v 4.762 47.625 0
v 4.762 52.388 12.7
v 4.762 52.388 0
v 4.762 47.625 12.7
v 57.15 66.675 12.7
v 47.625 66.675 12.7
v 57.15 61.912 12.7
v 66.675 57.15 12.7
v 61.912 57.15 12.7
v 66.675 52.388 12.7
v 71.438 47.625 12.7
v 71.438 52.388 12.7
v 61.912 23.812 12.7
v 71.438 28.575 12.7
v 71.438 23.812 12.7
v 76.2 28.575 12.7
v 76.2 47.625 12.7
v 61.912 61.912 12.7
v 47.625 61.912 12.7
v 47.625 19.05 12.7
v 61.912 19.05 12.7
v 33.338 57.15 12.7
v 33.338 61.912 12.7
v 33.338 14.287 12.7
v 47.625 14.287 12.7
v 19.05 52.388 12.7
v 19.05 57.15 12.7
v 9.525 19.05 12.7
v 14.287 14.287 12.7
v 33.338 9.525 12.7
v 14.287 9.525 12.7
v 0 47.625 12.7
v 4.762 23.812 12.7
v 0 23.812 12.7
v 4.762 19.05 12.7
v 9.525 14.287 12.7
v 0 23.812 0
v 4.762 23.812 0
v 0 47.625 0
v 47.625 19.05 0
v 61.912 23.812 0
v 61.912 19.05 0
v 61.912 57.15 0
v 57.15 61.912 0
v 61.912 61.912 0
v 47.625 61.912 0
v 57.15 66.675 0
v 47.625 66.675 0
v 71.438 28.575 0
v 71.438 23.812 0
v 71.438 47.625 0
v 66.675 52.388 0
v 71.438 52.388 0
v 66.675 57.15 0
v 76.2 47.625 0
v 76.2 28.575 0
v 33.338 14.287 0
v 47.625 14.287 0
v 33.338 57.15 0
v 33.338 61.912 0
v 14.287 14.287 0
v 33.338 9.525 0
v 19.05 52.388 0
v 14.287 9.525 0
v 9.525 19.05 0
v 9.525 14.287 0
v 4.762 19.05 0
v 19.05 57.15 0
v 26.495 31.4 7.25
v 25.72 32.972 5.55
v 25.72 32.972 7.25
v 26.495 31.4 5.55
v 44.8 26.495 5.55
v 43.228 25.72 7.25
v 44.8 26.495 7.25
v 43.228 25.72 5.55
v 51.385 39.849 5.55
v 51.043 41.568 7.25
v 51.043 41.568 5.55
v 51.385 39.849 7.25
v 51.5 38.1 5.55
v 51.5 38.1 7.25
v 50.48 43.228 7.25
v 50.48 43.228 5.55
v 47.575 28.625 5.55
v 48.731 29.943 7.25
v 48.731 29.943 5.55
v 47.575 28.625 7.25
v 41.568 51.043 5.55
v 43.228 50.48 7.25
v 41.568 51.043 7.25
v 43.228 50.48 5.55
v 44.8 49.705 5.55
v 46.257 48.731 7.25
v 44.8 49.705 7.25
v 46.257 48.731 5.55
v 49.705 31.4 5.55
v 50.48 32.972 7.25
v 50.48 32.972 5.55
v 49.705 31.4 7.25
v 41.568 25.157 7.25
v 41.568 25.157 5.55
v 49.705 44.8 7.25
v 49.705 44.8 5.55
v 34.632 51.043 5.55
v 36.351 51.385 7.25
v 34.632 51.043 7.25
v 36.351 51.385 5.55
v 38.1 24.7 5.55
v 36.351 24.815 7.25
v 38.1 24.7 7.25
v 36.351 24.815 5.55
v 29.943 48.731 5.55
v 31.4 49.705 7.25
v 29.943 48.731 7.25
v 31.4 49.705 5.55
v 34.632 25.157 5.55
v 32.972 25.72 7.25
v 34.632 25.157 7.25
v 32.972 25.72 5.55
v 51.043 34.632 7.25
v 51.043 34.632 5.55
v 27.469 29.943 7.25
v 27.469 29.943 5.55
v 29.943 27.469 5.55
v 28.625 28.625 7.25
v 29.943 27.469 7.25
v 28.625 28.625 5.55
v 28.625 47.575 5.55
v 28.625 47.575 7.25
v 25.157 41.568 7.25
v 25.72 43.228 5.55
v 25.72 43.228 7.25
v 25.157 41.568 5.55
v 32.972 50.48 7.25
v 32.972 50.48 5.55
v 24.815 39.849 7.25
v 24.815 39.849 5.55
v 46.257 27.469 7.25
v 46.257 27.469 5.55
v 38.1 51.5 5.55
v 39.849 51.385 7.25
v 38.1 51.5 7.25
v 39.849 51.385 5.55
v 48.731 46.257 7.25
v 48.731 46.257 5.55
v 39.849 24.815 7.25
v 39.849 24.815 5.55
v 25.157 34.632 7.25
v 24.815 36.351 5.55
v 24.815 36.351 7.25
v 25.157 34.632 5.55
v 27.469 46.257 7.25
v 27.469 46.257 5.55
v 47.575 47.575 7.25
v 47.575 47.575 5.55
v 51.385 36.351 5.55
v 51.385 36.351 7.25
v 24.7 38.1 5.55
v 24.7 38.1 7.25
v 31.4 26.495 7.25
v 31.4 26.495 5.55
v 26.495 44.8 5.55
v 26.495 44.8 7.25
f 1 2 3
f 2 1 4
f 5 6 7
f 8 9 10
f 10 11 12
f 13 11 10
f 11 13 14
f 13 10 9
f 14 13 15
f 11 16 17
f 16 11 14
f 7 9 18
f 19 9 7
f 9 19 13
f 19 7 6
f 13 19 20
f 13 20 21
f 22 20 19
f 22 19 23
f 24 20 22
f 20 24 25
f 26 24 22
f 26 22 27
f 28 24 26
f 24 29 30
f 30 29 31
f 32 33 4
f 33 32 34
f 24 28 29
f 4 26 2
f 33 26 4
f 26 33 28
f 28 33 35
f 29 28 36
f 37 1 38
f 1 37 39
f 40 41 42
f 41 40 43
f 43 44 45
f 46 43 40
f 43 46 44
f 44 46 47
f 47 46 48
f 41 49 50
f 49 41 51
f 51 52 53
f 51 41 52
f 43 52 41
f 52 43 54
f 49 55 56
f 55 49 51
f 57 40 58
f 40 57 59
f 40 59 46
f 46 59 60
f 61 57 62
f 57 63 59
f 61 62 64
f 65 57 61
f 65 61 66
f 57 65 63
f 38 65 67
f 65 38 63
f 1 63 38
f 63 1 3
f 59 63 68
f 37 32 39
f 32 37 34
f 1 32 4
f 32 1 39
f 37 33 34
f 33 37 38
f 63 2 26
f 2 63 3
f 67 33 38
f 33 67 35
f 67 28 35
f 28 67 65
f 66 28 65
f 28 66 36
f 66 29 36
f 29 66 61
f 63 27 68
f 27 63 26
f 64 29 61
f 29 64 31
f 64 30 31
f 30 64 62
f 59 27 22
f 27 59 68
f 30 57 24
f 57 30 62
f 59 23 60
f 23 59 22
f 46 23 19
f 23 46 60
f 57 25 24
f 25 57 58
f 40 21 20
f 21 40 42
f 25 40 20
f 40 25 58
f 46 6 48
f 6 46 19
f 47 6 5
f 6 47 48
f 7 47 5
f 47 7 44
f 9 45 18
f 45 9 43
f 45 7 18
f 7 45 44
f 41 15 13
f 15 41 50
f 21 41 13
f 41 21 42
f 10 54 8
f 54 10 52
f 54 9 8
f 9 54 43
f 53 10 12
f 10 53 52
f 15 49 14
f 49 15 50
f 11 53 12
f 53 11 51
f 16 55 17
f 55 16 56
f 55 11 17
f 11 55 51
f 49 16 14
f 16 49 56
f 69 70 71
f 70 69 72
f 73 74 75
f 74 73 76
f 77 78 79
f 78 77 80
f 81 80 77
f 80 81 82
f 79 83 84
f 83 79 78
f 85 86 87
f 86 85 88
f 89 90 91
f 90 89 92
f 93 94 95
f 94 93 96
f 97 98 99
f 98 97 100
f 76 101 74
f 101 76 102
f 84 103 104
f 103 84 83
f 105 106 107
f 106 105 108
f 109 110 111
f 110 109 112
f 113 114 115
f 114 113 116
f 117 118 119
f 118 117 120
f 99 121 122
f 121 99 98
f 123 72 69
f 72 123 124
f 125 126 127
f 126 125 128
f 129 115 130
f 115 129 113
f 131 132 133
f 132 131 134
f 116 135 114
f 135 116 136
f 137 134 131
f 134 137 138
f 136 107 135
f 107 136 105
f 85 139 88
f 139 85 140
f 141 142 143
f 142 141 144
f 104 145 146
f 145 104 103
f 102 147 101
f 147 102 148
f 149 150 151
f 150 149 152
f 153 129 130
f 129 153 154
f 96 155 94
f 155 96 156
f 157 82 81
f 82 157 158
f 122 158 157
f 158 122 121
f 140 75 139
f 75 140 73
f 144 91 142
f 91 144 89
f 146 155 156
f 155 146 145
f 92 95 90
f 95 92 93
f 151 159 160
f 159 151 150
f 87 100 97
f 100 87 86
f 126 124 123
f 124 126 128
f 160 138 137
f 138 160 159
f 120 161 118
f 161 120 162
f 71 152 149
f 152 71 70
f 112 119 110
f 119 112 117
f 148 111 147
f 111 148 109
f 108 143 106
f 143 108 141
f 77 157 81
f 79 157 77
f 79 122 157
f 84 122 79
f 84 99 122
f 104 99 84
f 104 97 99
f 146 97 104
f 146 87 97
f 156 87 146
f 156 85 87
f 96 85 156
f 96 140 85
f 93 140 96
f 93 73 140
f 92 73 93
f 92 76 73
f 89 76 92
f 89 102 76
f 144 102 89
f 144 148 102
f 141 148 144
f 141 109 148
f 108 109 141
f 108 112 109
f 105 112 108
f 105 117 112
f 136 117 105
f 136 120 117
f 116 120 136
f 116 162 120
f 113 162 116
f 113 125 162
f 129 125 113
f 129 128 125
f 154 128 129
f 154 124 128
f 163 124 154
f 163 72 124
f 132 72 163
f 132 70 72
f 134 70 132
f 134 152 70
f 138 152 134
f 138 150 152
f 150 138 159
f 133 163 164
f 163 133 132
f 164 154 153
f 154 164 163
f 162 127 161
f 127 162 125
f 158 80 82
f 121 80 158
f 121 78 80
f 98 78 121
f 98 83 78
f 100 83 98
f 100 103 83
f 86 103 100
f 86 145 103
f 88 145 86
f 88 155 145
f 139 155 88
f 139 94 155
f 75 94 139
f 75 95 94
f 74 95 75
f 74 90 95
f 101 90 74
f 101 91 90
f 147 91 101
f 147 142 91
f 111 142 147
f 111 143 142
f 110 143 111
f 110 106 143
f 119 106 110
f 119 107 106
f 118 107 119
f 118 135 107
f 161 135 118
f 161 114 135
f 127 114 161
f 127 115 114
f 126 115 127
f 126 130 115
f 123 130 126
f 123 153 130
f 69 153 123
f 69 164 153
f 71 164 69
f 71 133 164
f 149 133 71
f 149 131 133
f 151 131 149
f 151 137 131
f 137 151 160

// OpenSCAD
// iron_ingot — Minecraft Item Shape 3D Model
// Auto-generated from minecraft/textures/item/iron_ingot.png
//
// Open in OpenSCAD → F5 preview → F6 render → F7 export STL

// ============================================================
// PARAMETERS
// ============================================================

GRID_SIZE_IN    = 3.0;           // crafting table slot size
PIXELS          = 16;              // grid divisions (shape-fitted)
PIXEL_MM        = (GRID_SIZE_IN * 25.4) / PIXELS;  // mm per pixel

DEPTH_IN        = 0.5;          // extrusion depth in inches
DEPTH_MM        = DEPTH_IN * 25.4;

// NFC tag (NTAG215 25mm coin)
TAG_DIAMETER    = 26;           // mm — slightly oversized for easy drop-in
TAG_THICKNESS   = 1.2;         // mm
TAG_CLEARANCE   = 0.4;         // mm extra around tag

cavity_d = TAG_DIAMETER + TAG_CLEARANCE * 2;
cavity_h = TAG_THICKNESS + TAG_CLEARANCE;

echo(str("Tag cavity: ", cavity_d, "mm dia × ", cavity_h, "mm deep"));
echo(str("PAUSE AT: ", DEPTH_MM / 2 + cavity_h / 2, "mm to insert tag"));

module tag_cavity() {
    cx = (7.5 + 0.5) * PIXEL_MM;
    cy = (PIXELS - 1 - 7.5 + 0.5) * PIXEL_MM;
    translate([cx, cy, DEPTH_MM / 2 - cavity_h / 2])
        cylinder(d = cavity_d, h = cavity_h + 0.1, $fn = 48);
}

module tag_shelf() {
    cx = (7.5 + 0.5) * PIXEL_MM;
    cy = (PIXELS - 1 - 7.5 + 0.5) * PIXEL_MM;
    translate([cx, cy, DEPTH_MM / 2 - cavity_h / 2 - 1.0])
        cylinder(d = cavity_d + 4, h = 1.0, $fn = 48);
}

echo(str("Pixel size: ", PIXEL_MM, "mm"));
echo(str("Footprint: ", PIXELS * PIXEL_MM, "mm = ", GRID_SIZE_IN, " in"));
echo(str("Depth: ", DEPTH_MM, "mm = ", DEPTH_IN, " in"));

// ============================================================
// PIXEL MAP — 135 opaque pixels
// ============================================================

item_pixels = [
    [0.0,6.0], [0.0,7.0], [0.0,8.0], [0.0,9.0], [0.0,10.0], [1.0,5.0], [1.0,6.0], [1.0,7.0],
    [1.0,8.0], [1.0,9.0], [1.0,10.0], [1.0,11.0], [2.0,5.0], [2.0,6.0], [2.0,7.0], [2.0,8.0],
    [2.0,9.0], [2.0,10.0], [2.0,11.0], [2.0,12.0], [3.0,5.0], [3.0,6.0], [3.0,7.0], [3.0,8.0],
    [3.0,9.0], [3.0,10.0], [3.0,11.0], [3.0,12.0], [3.0,13.0], [4.0,4.0], [4.0,5.0], [4.0,6.0],
    [4.0,7.0], [4.0,8.0], [4.0,9.0], [4.0,10.0], [4.0,11.0], [4.0,12.0], [4.0,13.0], [5.0,4.0],
    [5.0,5.0], [5.0,6.0], [5.0,7.0], [5.0,8.0], [5.0,9.0], [5.0,10.0], [5.0,11.0], [5.0,12.0],
    [5.0,13.0], [6.0,4.0], [6.0,5.0], [6.0,6.0], [6.0,7.0], [6.0,8.0], [6.0,9.0], [6.0,10.0],
    [6.0,11.0], [6.0,12.0], [6.0,13.0], [7.0,3.0], [7.0,4.0], [7.0,5.0], [7.0,6.0], [7.0,7.0],
    [7.0,8.0], [7.0,9.0], [7.0,10.0], [7.0,11.0], [7.0,12.0], [8.0,3.0], [8.0,4.0], [8.0,5.0],
    [8.0,6.0], [8.0,7.0], [8.0,8.0], [8.0,9.0], [8.0,10.0], [8.0,11.0], [8.0,12.0], [9.0,3.0],
    [9.0,4.0], [9.0,5.0], [9.0,6.0], [9.0,7.0], [9.0,8.0], [9.0,9.0], [9.0,10.0], [9.0,11.0],
    [9.0,12.0], [10.0,2.0], [10.0,3.0], [10.0,4.0], [10.0,5.0], [10.0,6.0], [10.0,7.0], [10.0,8.0],
    [10.0,9.0], [10.0,10.0], [10.0,11.0], [11.0,2.0], [11.0,3.0], [11.0,4.0], [11.0,5.0], [11.0,6.0],
    [11.0,7.0], [11.0,8.0], [11.0,9.0], [11.0,10.0], [11.0,11.0], [12.0,3.0], [12.0,4.0], [12.0,5.0],
    [12.0,6.0], [12.0,7.0], [12.0,8.0], [12.0,9.0], [12.0,10.0], [12.0,11.0], [13.0,4.0], [13.0,5.0],
    [13.0,6.0], [13.0,7.0], [13.0,8.0], [13.0,9.0], [13.0,10.0], [14.0,5.0], [14.0,6.0], [14.0,7.0],
    [14.0,8.0], [14.0,9.0], [14.0,10.0], [15.0,6.0], [15.0,7.0], [15.0,8.0], [15.0,9.0]
];

// ============================================================
// MODULES
// ============================================================

module pixel_block(col, row) {
    translate([col * PIXEL_MM, (PIXELS - 1 - row) * PIXEL_MM, 0])
        cube([PIXEL_MM, PIXEL_MM, DEPTH_MM]);
}

module item_shape() {
    for (i = [0 : len(item_pixels) - 1])
        pixel_block(item_pixels[i][0], item_pixels[i][1]);
}

module item_final() {
    difference() {
        union() {
            item_shape();
            intersection() {
                item_shape();
                tag_shelf();
            }
        }
        tag_cavity();
    }
}

item_final();

// Cross-section view (uncomment to see tag cavity):
// difference() {
//     item_final();
//     translate([8 * PIXEL_MM + 50, 0, 0])
//         cube([100, 200, 100]);
// }
